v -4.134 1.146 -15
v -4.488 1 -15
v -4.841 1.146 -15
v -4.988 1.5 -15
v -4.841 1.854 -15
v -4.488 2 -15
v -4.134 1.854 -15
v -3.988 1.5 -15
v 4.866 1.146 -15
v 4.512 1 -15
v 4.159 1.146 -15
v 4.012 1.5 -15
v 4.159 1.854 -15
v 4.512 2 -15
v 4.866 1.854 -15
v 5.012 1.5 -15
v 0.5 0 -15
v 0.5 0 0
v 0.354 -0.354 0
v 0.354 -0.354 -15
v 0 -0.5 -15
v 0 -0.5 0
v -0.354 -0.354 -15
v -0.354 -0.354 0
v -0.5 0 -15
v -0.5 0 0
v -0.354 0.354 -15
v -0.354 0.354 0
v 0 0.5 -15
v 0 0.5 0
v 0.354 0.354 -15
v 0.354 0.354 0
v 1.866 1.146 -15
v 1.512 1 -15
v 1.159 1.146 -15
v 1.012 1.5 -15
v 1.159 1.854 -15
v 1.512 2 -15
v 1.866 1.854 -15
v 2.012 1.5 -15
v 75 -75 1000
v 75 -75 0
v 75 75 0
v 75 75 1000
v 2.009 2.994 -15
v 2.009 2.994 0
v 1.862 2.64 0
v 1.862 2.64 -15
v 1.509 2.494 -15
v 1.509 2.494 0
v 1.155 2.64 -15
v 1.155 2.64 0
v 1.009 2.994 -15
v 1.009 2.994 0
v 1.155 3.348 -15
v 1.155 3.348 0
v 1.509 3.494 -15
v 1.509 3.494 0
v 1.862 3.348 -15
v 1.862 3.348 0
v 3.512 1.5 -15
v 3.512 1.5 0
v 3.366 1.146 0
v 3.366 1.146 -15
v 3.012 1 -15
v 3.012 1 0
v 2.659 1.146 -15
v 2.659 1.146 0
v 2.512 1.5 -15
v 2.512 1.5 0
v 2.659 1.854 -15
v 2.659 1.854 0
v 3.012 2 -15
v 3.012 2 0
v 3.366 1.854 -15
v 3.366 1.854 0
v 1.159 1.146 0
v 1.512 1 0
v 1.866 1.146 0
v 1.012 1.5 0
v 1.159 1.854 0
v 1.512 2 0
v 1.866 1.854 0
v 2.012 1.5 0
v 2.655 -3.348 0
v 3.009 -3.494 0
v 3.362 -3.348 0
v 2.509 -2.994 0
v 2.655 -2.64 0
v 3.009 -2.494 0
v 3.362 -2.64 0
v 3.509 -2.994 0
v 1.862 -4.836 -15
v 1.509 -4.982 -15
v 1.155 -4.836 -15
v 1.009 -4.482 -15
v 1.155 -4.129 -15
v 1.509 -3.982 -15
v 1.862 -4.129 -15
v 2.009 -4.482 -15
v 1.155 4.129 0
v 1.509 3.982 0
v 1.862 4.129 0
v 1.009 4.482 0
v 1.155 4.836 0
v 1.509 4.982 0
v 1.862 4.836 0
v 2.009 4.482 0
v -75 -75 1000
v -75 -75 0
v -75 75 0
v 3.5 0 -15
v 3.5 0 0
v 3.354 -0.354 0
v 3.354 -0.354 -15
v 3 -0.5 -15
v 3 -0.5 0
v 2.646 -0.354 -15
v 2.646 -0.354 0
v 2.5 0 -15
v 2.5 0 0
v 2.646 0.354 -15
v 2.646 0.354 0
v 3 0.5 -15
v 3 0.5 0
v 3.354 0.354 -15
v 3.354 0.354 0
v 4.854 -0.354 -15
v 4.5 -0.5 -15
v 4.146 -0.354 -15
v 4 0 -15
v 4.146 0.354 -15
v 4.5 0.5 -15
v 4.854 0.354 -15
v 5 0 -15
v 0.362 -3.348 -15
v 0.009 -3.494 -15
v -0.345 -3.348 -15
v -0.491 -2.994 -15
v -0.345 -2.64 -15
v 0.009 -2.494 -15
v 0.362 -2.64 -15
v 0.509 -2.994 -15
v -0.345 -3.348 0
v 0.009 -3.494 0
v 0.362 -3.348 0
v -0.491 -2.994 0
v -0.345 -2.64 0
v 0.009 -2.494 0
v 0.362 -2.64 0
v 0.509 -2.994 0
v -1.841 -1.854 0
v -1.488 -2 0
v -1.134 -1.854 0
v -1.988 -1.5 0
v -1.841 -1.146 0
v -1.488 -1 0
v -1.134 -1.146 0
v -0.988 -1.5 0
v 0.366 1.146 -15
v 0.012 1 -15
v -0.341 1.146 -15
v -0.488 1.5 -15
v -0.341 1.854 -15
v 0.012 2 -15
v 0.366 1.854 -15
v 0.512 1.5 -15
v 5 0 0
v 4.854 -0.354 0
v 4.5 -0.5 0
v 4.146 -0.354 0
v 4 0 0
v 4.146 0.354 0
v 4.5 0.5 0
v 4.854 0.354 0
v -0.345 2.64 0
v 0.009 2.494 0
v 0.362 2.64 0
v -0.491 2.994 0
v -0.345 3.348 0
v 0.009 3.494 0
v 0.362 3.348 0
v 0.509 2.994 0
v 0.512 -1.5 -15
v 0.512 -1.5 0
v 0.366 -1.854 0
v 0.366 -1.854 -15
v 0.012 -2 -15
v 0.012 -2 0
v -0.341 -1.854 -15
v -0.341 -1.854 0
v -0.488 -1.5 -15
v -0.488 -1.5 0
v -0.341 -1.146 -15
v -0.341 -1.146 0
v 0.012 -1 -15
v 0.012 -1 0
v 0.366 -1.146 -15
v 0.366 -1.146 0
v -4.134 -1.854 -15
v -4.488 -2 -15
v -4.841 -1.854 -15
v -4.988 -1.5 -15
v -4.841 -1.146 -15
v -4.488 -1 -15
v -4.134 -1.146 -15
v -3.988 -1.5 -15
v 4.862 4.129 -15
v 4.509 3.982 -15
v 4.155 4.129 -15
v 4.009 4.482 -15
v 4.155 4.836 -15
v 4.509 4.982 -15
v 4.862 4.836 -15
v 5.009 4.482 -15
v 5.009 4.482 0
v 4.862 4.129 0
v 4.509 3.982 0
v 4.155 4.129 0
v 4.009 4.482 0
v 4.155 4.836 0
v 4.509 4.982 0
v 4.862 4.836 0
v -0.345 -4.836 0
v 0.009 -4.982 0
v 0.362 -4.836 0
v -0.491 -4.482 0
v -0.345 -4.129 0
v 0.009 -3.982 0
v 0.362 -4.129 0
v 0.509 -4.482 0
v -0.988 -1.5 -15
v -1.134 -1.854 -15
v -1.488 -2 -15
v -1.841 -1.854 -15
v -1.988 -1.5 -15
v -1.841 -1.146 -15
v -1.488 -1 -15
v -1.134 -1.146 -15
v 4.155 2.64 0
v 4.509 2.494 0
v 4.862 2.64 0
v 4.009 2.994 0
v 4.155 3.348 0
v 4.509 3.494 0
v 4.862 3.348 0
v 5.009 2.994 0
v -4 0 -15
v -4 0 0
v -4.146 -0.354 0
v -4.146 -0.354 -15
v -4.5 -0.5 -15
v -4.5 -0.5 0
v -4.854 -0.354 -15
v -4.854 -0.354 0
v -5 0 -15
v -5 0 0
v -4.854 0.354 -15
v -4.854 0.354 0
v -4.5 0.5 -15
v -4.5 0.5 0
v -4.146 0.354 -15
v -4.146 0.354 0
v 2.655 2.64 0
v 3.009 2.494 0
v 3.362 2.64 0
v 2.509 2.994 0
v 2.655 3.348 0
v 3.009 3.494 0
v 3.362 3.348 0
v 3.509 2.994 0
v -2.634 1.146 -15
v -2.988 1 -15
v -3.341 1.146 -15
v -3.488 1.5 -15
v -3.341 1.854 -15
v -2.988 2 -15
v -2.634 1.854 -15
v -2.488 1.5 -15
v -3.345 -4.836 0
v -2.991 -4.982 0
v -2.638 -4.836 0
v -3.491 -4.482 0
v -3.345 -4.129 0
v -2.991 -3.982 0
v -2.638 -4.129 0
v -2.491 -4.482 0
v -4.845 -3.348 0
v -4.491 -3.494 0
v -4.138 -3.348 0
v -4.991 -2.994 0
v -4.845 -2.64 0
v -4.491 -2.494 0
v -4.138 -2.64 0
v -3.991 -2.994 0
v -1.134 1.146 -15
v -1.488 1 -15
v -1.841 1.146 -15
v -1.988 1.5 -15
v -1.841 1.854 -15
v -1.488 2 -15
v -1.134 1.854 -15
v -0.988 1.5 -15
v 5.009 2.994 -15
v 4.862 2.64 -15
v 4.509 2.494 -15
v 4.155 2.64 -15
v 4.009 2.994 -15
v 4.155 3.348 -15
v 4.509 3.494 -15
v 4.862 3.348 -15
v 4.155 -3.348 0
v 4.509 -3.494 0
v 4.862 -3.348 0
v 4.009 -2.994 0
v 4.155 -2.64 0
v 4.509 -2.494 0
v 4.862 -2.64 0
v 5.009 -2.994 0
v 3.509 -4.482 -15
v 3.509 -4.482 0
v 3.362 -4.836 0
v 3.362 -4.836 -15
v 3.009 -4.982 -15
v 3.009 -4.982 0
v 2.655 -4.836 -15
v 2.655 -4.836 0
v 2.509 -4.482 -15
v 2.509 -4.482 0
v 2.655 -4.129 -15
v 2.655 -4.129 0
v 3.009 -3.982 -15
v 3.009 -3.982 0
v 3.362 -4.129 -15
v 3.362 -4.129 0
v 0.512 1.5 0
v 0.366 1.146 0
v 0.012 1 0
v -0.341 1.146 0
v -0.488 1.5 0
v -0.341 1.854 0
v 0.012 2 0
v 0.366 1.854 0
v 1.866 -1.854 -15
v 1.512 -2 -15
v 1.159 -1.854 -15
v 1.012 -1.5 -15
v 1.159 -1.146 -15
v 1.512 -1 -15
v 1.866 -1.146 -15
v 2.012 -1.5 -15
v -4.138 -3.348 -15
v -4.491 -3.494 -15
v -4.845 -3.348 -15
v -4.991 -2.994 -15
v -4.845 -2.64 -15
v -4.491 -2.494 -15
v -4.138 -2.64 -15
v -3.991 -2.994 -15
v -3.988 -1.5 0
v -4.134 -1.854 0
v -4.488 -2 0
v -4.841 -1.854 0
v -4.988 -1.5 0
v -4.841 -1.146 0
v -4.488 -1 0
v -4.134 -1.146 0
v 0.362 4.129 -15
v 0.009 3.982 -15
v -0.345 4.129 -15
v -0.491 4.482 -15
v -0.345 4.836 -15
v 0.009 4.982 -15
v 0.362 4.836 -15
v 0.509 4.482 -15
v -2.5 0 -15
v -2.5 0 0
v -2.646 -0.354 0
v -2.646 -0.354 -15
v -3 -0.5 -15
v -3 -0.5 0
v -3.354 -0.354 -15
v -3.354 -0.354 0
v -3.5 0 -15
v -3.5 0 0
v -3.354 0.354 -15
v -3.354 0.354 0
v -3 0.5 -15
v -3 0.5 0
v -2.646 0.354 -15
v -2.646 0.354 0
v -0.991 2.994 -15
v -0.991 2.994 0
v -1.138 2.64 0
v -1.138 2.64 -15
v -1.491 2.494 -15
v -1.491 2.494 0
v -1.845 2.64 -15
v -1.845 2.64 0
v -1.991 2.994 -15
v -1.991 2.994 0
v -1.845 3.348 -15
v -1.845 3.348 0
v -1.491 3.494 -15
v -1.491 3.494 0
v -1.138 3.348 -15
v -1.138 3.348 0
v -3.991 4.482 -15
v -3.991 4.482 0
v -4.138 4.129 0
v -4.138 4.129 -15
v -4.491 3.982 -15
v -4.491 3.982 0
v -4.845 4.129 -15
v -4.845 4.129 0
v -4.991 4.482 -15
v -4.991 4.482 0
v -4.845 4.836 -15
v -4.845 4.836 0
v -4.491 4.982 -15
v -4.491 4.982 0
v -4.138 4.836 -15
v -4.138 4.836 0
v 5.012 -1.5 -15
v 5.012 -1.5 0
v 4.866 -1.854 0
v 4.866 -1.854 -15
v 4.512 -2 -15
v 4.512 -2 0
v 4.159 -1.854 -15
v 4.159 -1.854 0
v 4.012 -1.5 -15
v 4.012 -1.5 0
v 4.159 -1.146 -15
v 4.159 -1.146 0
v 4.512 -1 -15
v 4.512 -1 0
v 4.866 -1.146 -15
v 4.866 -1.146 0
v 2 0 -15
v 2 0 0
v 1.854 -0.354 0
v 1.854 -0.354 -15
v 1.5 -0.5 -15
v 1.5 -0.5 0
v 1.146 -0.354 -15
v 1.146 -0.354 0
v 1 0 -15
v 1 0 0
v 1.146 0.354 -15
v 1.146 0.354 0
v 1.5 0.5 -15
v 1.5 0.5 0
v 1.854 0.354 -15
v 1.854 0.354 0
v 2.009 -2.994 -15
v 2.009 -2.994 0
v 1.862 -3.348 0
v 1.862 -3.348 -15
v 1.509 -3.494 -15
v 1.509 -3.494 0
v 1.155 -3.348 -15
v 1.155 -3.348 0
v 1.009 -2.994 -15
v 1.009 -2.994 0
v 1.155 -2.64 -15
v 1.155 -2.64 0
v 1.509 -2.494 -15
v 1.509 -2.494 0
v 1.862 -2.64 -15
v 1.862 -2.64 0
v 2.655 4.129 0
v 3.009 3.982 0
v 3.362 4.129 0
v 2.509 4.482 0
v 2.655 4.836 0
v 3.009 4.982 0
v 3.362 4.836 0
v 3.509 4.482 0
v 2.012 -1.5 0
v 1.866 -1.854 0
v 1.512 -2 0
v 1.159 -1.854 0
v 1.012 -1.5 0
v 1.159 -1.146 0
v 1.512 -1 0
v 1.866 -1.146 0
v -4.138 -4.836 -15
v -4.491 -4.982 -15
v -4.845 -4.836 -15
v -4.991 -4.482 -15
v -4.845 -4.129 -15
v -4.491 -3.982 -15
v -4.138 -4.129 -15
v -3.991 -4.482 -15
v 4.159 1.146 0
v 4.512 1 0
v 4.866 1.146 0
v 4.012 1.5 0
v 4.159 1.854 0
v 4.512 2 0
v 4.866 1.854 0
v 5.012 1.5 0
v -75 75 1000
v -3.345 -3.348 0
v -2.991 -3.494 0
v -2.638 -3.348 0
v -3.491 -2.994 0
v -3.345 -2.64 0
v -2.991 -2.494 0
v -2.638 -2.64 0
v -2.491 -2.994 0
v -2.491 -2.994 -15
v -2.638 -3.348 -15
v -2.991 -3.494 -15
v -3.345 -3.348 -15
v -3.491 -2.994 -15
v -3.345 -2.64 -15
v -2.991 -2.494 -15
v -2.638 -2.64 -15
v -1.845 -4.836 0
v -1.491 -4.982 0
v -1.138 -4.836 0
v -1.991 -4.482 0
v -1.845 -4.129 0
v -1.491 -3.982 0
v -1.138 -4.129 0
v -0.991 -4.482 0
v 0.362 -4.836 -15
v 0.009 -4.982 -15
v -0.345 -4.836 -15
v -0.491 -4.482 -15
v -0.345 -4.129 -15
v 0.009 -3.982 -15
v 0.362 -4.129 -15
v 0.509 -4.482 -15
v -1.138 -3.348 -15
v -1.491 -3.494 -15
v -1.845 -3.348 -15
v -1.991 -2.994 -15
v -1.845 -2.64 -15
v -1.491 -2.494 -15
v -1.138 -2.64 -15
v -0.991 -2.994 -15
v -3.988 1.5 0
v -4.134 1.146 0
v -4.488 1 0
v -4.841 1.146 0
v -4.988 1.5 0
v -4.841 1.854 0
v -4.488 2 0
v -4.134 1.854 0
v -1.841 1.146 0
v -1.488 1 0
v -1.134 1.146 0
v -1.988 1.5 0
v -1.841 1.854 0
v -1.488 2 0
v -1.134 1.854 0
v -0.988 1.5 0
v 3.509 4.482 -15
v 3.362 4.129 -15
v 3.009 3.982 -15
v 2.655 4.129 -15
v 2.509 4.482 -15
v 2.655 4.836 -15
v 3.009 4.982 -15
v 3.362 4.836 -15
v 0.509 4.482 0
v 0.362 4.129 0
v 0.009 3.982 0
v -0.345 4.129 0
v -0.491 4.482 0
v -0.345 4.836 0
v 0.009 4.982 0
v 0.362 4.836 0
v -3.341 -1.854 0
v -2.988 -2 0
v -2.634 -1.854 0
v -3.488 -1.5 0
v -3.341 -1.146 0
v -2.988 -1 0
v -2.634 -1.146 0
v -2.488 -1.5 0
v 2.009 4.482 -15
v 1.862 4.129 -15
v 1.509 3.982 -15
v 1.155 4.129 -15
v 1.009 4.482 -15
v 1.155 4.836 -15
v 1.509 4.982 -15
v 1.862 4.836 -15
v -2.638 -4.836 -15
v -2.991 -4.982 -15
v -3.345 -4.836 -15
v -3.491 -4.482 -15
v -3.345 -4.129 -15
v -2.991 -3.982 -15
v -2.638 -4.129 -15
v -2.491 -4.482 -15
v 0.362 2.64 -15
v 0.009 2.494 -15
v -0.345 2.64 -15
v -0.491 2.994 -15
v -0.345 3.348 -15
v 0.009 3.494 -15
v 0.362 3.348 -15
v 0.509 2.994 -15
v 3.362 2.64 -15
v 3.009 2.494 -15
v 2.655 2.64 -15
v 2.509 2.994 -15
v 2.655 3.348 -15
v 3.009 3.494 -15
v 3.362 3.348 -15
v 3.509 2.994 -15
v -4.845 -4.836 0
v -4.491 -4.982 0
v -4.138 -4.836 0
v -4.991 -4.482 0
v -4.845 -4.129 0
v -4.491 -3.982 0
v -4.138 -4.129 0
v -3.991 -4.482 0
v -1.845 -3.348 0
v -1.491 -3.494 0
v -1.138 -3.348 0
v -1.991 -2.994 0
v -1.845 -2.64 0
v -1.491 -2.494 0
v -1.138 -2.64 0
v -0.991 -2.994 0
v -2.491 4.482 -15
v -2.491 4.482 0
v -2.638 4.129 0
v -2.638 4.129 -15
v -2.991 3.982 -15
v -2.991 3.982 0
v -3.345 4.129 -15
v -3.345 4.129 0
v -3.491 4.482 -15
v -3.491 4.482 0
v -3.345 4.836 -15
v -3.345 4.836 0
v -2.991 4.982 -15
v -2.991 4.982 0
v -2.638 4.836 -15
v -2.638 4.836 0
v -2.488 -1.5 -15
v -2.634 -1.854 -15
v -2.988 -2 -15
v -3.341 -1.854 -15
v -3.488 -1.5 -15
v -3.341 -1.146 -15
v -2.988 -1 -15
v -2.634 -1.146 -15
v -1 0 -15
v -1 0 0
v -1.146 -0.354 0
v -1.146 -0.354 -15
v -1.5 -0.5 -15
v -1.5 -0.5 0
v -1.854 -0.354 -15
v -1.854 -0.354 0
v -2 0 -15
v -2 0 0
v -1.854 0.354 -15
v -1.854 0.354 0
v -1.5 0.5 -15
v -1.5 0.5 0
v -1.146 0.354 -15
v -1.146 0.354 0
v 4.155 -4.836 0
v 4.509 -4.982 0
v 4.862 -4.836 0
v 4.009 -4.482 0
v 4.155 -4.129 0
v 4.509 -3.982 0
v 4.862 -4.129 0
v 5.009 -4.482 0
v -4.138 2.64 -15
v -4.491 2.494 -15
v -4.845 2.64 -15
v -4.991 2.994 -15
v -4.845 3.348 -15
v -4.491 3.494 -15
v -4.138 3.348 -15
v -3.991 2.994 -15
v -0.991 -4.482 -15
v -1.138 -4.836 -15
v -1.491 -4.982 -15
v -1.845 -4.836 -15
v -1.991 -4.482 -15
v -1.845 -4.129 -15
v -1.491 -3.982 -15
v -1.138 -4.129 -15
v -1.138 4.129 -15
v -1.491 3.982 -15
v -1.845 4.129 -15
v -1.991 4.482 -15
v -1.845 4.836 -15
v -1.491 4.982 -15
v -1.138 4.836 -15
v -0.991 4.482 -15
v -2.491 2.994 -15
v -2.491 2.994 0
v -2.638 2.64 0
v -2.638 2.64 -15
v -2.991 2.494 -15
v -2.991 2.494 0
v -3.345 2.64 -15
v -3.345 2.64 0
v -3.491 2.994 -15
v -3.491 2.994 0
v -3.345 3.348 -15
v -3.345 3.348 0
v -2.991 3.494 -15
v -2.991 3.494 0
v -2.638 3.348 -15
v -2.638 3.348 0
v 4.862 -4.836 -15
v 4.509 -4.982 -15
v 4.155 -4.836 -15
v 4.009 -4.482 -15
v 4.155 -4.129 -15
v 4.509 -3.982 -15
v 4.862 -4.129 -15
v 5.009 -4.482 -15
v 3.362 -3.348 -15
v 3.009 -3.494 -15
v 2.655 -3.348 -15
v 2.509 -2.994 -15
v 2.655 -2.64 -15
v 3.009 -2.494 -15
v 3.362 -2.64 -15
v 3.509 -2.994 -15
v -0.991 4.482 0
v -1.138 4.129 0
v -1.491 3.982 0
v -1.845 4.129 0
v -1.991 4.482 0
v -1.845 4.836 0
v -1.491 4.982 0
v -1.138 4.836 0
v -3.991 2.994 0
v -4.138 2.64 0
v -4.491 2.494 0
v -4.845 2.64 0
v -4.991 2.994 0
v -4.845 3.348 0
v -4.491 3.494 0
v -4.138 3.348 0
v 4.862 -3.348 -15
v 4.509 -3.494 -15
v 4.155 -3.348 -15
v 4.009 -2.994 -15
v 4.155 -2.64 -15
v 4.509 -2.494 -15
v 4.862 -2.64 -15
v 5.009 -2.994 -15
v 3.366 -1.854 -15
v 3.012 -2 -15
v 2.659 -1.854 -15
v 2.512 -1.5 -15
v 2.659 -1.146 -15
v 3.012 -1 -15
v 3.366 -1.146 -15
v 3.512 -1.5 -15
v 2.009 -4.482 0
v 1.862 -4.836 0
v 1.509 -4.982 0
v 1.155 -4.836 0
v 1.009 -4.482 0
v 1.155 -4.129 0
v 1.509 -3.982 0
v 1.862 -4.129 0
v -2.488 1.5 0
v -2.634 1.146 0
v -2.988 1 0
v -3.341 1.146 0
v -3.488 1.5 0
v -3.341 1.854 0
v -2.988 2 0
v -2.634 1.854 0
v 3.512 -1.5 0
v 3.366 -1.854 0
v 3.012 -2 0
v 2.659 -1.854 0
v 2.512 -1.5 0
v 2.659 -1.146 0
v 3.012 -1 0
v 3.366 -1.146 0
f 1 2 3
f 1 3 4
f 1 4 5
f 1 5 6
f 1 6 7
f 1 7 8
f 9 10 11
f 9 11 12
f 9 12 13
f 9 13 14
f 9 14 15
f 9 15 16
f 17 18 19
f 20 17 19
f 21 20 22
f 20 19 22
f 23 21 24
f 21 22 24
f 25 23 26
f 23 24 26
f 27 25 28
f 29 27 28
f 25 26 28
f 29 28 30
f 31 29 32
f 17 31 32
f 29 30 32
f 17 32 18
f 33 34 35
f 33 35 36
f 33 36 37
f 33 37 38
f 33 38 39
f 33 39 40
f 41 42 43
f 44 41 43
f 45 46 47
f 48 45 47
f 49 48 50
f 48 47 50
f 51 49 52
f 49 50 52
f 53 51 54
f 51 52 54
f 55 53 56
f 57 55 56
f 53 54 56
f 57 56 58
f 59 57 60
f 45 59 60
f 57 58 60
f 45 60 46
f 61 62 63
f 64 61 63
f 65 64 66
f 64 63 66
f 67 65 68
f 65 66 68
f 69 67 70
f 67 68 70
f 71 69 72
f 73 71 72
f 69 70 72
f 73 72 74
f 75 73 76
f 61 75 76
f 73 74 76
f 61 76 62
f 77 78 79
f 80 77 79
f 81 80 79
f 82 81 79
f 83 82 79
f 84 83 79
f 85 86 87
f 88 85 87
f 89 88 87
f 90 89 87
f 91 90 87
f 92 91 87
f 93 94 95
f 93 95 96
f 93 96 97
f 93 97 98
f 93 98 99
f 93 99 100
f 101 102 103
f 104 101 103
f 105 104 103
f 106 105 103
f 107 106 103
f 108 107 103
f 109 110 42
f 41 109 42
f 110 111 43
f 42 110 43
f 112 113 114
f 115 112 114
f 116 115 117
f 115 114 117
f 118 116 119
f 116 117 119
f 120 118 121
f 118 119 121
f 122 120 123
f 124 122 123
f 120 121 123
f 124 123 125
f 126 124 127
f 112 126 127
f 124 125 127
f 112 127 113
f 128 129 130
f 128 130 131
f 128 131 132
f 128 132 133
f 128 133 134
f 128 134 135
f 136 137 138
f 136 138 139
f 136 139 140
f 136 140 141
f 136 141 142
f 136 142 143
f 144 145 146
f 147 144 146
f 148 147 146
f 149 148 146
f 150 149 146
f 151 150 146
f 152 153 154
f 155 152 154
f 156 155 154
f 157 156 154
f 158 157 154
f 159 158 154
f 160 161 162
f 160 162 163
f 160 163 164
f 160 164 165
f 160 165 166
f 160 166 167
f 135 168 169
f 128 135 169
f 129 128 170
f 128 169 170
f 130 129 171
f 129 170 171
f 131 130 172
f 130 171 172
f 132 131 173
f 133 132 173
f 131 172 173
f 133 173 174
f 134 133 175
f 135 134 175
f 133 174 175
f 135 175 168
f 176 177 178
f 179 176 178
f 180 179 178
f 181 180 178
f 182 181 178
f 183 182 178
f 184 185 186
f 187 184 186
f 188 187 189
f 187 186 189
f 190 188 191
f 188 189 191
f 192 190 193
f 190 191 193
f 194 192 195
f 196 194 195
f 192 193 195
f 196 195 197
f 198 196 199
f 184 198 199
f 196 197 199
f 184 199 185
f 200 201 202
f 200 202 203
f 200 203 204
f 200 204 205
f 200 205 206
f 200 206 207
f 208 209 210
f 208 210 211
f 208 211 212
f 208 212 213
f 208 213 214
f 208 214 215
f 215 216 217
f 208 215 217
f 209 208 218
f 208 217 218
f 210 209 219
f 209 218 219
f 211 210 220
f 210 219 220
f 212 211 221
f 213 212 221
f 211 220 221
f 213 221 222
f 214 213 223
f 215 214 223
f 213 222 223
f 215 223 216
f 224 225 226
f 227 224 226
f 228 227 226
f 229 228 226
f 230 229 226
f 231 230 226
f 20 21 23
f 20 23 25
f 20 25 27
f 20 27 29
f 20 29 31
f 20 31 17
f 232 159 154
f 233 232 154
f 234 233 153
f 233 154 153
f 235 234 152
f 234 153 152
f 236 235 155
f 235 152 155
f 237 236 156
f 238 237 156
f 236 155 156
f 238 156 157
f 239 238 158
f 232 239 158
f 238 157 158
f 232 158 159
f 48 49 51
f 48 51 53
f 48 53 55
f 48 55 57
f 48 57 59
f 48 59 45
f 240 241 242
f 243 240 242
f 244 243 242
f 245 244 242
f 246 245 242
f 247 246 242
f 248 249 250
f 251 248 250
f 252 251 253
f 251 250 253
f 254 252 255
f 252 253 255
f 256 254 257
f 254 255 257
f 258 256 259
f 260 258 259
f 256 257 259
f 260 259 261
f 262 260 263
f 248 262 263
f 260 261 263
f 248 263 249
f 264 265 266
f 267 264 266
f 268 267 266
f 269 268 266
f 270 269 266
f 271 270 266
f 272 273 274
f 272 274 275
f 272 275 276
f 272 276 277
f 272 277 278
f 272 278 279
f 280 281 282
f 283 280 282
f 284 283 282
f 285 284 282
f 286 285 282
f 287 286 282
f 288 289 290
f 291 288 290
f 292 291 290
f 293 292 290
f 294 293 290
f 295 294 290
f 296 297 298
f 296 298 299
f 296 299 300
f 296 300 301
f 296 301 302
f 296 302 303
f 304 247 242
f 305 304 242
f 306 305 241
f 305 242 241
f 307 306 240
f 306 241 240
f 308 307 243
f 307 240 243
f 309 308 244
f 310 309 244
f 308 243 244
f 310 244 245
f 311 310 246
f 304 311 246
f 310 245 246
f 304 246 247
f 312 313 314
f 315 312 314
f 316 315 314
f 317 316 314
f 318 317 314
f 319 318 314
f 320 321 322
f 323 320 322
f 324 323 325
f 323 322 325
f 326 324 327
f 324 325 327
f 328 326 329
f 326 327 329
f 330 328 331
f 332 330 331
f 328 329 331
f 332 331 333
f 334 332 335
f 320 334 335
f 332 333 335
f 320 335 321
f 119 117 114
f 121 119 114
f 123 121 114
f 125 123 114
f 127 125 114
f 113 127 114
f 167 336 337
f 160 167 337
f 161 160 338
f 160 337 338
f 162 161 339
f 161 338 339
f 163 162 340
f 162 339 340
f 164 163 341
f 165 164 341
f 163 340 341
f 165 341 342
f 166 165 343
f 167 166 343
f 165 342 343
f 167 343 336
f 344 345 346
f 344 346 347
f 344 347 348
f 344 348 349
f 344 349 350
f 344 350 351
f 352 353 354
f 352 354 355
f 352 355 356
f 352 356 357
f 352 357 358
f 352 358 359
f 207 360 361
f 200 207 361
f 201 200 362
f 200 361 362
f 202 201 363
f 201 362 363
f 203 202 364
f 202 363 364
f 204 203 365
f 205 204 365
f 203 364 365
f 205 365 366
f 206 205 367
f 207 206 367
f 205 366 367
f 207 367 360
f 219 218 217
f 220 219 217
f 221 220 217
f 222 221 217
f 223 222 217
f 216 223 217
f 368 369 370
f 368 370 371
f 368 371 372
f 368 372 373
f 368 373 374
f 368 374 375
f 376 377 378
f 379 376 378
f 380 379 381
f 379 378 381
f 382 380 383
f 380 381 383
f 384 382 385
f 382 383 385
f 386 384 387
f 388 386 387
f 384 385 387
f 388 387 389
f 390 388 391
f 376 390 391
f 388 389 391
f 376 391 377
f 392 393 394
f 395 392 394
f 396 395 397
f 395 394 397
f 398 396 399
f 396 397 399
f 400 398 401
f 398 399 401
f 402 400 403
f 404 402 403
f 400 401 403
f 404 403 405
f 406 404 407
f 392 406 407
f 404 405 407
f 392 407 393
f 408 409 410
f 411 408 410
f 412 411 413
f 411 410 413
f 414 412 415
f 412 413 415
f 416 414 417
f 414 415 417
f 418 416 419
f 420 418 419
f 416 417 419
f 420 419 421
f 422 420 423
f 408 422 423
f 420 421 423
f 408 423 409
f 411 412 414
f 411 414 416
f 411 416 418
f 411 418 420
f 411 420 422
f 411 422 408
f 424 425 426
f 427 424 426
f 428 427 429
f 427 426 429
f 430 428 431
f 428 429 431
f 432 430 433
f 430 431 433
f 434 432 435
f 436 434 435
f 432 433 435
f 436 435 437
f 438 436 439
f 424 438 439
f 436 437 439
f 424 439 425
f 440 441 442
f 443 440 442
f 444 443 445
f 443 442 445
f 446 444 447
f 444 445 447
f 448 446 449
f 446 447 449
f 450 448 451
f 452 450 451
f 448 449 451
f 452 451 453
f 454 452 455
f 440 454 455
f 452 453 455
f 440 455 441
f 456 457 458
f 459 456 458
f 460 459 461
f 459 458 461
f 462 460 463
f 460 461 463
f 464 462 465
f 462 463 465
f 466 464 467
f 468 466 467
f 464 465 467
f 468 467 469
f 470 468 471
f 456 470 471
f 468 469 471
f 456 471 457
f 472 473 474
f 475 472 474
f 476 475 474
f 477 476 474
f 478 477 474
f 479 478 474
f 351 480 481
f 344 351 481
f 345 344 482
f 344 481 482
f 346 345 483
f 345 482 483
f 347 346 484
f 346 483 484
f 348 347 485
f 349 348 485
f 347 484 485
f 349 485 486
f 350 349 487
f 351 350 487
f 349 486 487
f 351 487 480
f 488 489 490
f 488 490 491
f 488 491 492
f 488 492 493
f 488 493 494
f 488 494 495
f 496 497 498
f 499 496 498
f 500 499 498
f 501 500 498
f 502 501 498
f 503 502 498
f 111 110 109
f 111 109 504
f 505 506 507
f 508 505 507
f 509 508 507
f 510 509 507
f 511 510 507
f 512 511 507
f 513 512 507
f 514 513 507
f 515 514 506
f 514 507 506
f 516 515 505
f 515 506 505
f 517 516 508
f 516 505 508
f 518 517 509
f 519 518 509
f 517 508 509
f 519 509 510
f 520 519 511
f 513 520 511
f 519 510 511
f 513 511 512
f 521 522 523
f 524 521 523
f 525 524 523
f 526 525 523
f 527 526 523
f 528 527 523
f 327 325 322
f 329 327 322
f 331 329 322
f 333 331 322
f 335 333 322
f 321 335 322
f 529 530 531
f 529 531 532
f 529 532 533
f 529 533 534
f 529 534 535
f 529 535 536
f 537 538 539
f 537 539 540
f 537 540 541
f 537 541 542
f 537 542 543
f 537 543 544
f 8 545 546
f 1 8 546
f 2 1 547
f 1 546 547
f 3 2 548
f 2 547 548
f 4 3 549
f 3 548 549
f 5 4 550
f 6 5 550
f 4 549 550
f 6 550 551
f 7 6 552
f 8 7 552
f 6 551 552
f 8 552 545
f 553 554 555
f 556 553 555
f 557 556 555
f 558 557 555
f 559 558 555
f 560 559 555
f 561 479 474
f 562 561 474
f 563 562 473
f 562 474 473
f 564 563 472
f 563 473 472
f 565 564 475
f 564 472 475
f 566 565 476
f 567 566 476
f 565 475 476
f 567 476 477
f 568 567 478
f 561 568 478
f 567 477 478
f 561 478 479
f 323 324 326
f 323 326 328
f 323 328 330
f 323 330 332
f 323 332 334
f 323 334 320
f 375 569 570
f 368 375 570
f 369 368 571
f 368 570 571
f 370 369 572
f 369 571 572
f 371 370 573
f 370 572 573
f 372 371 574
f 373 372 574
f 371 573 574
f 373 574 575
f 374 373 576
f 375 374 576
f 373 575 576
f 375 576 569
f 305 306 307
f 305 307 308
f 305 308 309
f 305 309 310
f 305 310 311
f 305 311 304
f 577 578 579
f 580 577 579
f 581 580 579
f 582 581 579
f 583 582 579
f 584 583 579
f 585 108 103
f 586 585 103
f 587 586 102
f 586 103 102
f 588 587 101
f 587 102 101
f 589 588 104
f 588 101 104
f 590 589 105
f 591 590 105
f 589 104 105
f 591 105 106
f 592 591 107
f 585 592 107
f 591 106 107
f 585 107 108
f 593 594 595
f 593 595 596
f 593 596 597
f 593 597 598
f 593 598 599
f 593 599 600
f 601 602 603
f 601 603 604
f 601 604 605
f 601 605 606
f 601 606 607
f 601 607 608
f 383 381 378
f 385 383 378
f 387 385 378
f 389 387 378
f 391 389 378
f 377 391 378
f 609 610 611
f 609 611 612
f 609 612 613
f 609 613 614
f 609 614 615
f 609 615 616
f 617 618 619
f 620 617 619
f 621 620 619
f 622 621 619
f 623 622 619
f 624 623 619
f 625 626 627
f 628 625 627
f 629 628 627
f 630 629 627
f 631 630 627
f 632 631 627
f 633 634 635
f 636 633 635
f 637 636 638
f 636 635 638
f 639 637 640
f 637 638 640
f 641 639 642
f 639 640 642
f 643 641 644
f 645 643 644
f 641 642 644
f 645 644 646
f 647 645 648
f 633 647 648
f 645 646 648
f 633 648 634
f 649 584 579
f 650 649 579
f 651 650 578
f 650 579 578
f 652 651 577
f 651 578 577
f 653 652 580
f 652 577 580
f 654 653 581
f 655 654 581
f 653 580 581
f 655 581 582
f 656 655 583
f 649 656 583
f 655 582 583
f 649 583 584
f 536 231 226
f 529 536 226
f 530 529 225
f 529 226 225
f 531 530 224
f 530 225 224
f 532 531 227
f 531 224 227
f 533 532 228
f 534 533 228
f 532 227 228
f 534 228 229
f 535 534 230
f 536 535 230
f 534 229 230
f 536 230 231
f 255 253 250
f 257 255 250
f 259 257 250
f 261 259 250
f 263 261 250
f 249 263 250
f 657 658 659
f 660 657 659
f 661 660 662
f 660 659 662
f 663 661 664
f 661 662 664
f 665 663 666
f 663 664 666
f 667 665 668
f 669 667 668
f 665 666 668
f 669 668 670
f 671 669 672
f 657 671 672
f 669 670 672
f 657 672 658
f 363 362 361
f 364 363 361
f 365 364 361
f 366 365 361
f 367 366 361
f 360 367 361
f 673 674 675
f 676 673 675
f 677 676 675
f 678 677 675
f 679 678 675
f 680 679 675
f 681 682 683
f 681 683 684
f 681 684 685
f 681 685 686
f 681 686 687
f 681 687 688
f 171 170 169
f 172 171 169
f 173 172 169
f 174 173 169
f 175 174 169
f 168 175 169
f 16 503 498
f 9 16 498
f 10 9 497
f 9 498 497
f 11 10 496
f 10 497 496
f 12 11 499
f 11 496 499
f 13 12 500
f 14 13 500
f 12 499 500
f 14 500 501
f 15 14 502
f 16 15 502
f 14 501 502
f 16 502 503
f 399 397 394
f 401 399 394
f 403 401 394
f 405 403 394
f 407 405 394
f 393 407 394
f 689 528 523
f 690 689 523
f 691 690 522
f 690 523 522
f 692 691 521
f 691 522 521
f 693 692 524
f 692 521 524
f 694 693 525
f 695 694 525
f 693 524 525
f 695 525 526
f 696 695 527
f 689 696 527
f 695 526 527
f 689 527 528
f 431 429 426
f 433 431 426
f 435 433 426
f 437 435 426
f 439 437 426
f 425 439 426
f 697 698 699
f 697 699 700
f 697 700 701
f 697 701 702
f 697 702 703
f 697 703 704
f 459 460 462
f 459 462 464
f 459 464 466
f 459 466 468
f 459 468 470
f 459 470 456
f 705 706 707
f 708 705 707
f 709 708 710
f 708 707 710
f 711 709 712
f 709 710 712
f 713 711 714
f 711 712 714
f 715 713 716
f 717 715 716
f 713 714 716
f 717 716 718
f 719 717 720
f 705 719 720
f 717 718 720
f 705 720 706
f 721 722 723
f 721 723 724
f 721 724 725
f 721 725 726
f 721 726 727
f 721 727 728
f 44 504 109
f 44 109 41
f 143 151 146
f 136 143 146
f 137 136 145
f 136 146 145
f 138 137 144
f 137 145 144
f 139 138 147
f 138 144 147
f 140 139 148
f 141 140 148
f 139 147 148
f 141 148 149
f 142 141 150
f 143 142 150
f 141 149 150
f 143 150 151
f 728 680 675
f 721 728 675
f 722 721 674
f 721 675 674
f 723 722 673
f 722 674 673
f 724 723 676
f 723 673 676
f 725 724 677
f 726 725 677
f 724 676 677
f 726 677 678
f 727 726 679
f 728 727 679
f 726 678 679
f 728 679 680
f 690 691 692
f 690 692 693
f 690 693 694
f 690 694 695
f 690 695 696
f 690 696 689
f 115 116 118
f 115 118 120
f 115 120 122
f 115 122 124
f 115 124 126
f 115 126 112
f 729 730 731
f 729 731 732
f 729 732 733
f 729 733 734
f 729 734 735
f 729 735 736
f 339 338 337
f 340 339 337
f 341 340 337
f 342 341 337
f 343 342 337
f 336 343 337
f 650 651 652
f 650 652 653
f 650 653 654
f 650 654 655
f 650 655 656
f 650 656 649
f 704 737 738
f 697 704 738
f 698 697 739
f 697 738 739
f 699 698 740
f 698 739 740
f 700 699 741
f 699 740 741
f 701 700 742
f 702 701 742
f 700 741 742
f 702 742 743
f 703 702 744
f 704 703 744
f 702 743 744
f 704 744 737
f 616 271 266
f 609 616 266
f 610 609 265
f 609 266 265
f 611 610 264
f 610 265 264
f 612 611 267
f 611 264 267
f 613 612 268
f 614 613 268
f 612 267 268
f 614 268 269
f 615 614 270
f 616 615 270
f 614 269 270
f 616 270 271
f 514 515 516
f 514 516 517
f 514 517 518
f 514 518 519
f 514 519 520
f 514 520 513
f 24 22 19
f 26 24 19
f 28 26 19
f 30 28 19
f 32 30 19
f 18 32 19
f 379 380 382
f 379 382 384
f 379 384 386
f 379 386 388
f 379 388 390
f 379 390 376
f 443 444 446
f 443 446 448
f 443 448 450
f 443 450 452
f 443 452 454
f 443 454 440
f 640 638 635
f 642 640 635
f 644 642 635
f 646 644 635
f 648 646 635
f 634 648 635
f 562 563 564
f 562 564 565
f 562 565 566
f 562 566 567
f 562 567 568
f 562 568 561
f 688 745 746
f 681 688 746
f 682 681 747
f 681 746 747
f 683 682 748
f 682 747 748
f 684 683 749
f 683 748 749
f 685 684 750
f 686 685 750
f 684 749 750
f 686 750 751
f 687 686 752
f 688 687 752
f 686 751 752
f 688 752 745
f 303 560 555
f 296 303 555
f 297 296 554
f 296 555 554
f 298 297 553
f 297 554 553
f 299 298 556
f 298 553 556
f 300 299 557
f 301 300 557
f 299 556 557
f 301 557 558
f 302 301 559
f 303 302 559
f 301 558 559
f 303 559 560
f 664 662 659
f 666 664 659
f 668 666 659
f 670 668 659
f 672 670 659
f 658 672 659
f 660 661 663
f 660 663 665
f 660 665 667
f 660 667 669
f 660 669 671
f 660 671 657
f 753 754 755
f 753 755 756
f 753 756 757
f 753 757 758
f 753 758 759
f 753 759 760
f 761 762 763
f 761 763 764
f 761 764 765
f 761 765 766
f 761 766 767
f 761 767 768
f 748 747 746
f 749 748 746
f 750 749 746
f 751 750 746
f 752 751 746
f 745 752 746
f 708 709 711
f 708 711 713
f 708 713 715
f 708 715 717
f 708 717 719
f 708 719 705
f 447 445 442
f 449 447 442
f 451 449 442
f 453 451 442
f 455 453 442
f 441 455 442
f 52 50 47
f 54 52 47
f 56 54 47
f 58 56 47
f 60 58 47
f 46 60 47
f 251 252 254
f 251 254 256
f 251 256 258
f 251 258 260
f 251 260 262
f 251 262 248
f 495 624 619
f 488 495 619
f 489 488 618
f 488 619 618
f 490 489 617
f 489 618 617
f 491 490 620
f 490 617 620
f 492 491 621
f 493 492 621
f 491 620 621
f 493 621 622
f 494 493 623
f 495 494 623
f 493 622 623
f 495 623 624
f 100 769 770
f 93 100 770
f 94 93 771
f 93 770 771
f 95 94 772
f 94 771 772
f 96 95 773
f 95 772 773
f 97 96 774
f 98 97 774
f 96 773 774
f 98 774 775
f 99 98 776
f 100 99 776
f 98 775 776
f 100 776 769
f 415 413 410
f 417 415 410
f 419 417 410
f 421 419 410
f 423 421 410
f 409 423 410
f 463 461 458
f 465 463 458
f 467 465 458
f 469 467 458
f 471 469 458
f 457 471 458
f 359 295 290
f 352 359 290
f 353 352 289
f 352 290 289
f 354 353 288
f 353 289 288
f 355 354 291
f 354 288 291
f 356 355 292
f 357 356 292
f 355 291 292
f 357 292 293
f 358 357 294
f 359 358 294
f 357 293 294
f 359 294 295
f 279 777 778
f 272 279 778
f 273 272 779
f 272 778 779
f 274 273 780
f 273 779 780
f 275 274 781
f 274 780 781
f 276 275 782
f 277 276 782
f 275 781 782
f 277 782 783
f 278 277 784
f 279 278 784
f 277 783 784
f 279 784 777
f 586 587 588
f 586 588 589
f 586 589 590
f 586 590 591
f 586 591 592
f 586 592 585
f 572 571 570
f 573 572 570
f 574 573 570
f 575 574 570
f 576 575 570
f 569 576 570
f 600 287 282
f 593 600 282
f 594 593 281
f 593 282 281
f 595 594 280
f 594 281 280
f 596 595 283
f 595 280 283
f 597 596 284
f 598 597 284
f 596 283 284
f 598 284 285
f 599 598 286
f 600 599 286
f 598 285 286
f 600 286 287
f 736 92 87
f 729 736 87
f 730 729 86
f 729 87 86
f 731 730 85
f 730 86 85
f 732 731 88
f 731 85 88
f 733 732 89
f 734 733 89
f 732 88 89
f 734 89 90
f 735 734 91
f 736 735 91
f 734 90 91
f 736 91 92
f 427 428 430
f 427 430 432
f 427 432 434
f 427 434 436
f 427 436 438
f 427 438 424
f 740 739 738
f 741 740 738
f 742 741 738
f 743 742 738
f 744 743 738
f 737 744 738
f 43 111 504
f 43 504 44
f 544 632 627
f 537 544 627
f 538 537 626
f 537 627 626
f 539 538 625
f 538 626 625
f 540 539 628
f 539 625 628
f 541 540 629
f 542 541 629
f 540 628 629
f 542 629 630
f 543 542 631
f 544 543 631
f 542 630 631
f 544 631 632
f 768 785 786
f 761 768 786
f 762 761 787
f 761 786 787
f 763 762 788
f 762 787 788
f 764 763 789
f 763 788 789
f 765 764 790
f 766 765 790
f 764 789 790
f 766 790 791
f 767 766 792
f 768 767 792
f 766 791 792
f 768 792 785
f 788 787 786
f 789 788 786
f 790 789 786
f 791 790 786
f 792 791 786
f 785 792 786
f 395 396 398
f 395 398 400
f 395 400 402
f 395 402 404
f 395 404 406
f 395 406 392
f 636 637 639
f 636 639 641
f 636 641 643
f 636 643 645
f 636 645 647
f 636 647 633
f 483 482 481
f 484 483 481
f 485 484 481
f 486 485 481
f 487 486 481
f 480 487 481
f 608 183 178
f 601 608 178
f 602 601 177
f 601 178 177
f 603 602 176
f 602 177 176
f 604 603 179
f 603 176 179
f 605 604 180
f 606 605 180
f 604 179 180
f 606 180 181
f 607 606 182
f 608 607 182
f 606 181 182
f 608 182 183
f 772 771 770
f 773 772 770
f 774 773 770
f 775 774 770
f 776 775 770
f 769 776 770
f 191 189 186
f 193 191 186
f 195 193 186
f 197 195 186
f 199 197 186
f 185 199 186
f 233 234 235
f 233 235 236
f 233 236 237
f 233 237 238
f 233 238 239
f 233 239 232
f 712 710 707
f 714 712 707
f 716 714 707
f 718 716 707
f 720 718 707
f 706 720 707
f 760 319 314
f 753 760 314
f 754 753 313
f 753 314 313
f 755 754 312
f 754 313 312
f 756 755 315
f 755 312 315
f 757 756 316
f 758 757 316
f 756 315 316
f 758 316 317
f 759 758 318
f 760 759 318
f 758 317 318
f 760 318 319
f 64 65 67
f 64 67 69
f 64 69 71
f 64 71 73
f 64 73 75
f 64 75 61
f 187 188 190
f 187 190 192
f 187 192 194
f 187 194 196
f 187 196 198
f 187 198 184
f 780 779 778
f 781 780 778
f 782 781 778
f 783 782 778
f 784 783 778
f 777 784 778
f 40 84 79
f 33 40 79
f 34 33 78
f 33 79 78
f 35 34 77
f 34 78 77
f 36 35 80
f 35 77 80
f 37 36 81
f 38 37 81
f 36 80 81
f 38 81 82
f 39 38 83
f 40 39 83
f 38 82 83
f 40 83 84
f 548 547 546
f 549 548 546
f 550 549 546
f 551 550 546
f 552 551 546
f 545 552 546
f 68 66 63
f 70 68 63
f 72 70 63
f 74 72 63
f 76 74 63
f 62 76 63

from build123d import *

# Parameters (mm, degrees)
F0_W     = 150
F0_H     = 150
F1_DEPTH = 1000
F2_R     = 0.5
F3_DEPTH = 15


with BuildPart() as f1:
    # F0 (on Top) → F1 (new body)
    with BuildSketch(Plane.XY):
        Rectangle(F0_W, F0_H)
    extrude(amount=F1_DEPTH)


with BuildPart() as f3:
    # F2 (on face) → F3 (new body)
    with BuildSketch(Plane(origin=(0, 0, 0), x_dir=(1, 0, 0), z_dir=(0, 0, -1))):
        with Locations((3.008616, -2.993949)):
            Circle(F2_R)
        with Locations((-2.991219, 4.482475)):
            Circle(F2_R)
        with Locations((1.512125, -1.499951)):
            Circle(F2_R)
        with Locations((-2.991384, -2.993949)):
            Circle(F2_R)
        with Locations((-4.487875, 1.499951)):
            Circle(F2_R)
        with Locations((4.508781, 4.482475)):
            Circle(F2_R)
        with Locations((-4.491384, 2.993949)):
            Circle(F2_R)
        with Locations((1.508781, 4.482475)):
            Circle(F2_R)
        with Locations((3.008616, 2.993949)):
            Circle(F2_R)
        with Locations((-4.491384, -2.993949)):
            Circle(F2_R)
        with Locations((-1.491384, 2.993949)):
            Circle(F2_R)
        with Locations((-1.491384, -2.993949)):
            Circle(F2_R)
        with Locations((3.012125, -1.499951)):
            Circle(F2_R)
        with Locations((-2.991219, -4.482475)):
            Circle(F2_R)
        with Locations((1.508781, -4.482475)):
            Circle(F2_R)
        Circle(F2_R)
        with Locations((1.5, 0)):
            Circle(F2_R)
        with Locations((3, 0)):
            Circle(F2_R)
        with Locations((4.5, 0)):
            Circle(F2_R)
        with Locations((-1.5, 0)):
            Circle(F2_R)
        with Locations((-3, 0)):
            Circle(F2_R)
        with Locations((-4.5, 0)):
            Circle(F2_R)
        with Locations((0.012125, 1.499951)):
            Circle(F2_R)
        with Locations((1.512125, 1.499951)):
            Circle(F2_R)
        with Locations((3.012125, 1.499951)):
            Circle(F2_R)
        with Locations((4.512125, 1.499951)):
            Circle(F2_R)
        with Locations((4.508616, -2.993949)):
            Circle(F2_R)
        with Locations((-1.487875, 1.499951)):
            Circle(F2_R)
        with Locations((-4.487875, -1.499951)):
            Circle(F2_R)
        with Locations((-2.991384, 2.993949)):
            Circle(F2_R)
        with Locations((-2.987875, 1.499951)):
            Circle(F2_R)
        with Locations((4.508781, -4.482475)):
            Circle(F2_R)
        with Locations((3.008781, 4.482475)):
            Circle(F2_R)
        with Locations((-1.487875, -1.499951)):
            Circle(F2_R)
        with Locations((-4.491219, -4.482475)):
            Circle(F2_R)
        with Locations((-4.491219, 4.482475)):
            Circle(F2_R)
        with Locations((4.512125, -1.499951)):
            Circle(F2_R)
        with Locations((-2.987875, -1.499951)):
            Circle(F2_R)
        with Locations((4.508616, 2.993949)):
            Circle(F2_R)
        with Locations((0.012125, -1.499951)):
            Circle(F2_R)
        with Locations((3.008781, -4.482475)):
            Circle(F2_R)
        with Locations((0.008781, -4.482475)):
            Circle(F2_R)
        with Locations((-1.491219, -4.482475)):
            Circle(F2_R)
        with Locations((0.008781, 4.482475)):
            Circle(F2_R)
        with Locations((-1.491219, 4.482475)):
            Circle(F2_R)
        with Locations((1.508616, -2.993949)):
            Circle(F2_R)
        with Locations((0.008616, -2.993949)):
            Circle(F2_R)
        with Locations((0.008616, 2.993949)):
            Circle(F2_R)
        with Locations((1.508616, 2.993949)):
            Circle(F2_R)
    extrude(amount=F3_DEPTH)


solid = Compound([f1.part, f3.part])
